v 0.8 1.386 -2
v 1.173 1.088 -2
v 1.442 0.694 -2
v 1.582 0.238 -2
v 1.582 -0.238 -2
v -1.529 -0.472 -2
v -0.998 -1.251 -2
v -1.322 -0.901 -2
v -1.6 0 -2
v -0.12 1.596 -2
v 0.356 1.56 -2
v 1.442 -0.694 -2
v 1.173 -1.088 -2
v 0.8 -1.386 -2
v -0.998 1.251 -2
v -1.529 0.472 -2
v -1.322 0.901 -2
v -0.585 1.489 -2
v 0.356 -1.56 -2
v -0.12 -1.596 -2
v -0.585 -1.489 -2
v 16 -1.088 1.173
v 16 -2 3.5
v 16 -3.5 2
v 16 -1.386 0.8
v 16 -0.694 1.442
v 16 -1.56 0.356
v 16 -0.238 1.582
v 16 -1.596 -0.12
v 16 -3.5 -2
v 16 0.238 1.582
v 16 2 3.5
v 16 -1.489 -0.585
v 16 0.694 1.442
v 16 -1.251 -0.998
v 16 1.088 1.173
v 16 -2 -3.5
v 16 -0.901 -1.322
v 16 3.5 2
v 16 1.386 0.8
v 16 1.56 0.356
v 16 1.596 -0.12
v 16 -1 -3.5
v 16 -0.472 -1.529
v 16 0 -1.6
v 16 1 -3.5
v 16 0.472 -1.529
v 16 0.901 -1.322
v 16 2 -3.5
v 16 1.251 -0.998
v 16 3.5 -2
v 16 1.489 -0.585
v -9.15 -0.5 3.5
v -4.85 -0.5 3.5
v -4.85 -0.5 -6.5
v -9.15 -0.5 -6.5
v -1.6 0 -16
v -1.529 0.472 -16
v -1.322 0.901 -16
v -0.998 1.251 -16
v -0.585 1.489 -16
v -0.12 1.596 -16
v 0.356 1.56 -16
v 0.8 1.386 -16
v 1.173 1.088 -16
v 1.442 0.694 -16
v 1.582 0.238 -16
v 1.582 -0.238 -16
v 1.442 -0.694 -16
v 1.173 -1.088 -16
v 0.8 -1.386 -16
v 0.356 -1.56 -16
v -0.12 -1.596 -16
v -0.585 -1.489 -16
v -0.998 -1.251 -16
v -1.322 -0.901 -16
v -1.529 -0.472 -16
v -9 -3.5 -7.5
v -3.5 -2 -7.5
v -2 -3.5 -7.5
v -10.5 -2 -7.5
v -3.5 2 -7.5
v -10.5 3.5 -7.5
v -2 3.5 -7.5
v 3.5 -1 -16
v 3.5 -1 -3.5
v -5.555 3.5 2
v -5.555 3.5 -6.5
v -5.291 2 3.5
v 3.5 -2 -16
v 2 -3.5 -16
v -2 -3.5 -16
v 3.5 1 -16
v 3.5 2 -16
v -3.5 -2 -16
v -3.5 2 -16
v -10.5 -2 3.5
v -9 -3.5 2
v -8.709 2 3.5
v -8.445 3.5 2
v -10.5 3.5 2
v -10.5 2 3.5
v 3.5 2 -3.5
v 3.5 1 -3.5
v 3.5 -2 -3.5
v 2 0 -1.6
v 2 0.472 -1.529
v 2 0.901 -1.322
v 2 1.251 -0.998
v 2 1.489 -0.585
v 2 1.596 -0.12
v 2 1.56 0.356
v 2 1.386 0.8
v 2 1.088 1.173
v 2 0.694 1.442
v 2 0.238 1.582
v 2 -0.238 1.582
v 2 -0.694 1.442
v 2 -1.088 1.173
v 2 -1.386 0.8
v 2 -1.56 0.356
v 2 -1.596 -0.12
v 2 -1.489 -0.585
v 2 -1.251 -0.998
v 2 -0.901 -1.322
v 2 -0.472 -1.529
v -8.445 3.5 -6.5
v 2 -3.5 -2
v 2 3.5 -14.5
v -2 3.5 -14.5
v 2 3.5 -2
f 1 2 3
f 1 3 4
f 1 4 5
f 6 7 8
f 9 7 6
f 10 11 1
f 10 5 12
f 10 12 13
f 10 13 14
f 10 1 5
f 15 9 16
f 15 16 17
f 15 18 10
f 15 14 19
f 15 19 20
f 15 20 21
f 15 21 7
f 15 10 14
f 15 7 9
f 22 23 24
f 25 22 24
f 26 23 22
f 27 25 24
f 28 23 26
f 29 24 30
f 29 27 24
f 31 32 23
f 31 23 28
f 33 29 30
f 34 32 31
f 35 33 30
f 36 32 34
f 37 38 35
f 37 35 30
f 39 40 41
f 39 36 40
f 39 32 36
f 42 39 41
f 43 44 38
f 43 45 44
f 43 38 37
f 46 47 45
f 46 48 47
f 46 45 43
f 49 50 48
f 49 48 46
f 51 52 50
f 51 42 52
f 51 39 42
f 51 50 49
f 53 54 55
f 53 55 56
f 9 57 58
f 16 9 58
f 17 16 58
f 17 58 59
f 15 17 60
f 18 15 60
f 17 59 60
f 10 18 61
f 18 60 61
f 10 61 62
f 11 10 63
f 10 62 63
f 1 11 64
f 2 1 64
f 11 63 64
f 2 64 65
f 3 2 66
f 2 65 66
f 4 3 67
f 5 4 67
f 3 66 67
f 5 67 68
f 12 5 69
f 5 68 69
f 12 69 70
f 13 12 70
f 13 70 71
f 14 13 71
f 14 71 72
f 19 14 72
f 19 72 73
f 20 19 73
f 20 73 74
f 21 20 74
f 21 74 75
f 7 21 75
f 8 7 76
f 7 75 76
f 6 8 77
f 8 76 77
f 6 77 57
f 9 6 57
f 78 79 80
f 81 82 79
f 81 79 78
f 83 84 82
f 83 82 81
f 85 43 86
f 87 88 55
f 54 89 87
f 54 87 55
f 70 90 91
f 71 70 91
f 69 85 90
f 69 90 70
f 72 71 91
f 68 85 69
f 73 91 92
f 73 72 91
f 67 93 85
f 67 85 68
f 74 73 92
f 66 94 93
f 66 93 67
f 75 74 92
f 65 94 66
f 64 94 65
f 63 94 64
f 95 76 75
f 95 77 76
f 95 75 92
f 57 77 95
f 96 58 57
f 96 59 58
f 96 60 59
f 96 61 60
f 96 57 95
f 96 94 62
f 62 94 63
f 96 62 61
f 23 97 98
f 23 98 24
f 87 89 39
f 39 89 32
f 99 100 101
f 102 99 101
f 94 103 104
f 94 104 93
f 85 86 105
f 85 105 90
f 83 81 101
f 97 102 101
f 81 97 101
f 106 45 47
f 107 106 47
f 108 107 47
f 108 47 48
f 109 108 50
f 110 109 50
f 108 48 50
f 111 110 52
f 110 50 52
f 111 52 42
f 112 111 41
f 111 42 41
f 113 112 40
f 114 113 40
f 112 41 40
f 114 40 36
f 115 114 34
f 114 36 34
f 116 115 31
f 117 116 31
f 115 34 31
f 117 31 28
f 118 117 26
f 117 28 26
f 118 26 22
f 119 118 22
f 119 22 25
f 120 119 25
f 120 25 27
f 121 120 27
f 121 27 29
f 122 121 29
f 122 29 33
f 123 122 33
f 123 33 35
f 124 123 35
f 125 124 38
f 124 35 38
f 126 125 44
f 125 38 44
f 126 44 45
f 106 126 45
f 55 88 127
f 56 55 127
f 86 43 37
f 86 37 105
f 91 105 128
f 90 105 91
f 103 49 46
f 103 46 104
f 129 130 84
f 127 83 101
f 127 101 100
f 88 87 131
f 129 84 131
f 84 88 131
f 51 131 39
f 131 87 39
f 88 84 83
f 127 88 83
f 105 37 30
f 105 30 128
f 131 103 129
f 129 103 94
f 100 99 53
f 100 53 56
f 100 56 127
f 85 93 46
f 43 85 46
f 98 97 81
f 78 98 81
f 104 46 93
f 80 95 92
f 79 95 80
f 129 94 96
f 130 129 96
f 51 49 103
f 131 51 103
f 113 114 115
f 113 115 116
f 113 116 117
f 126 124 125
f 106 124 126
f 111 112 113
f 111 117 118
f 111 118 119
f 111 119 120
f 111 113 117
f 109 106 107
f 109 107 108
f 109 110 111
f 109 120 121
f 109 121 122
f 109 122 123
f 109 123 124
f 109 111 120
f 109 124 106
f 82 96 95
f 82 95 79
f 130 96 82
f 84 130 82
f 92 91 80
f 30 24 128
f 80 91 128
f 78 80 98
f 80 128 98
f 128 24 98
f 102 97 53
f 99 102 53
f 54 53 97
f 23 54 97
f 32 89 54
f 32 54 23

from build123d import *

# Parameters (mm, degrees)
BOSS_EXTRUDE1_DEPTH  = 3.5
SKETCH2_R            = 1.6
CUT_EXTRUDE1_DEPTH   = 14
SKETCH3_R            = 1.6
CUT_EXTRUDE2_DEPTH   = 14
BOSS_EXTRUDE2_DEPTH  = 1
BOSS_EXTRUDE13_START = -19.5
BOSS_EXTRUDE13_DEPTH = 10
BOSS_EXTRUDE14_DEPTH = 1
CHAMFER7_SIZE        = 1.5


with BuildPart() as part:
    # Sketch1 → Boss-Extrude1 (new, symmetric)
    with BuildSketch(Plane(origin=(0, 0, 0), x_dir=(1, 0, 0), z_dir=(0, 1, 0))):
        Polygon((-3.5, 16), (-3.5, -3.5), (16, -3.5), (16, 3.5), (3.5, 3.5), (3.5, 16), align=None)
    extrude(amount=BOSS_EXTRUDE1_DEPTH, both=True)

    # Sketch2 → Cut-Extrude1 (cut)
    with BuildSketch(Plane(origin=(0, 0, -16), x_dir=(-1, 0, 0), z_dir=(0, 0, -1))):
        Circle(SKETCH2_R)
    extrude(amount=-CUT_EXTRUDE1_DEPTH, mode=Mode.SUBTRACT)

    # Sketch3 → Cut-Extrude2 (cut)
    with BuildSketch(Plane(origin=(16, 0, 0), x_dir=(0, 0, -1), z_dir=(1, 0, 0))):
        Circle(SKETCH3_R)
    extrude(amount=-CUT_EXTRUDE2_DEPTH, mode=Mode.SUBTRACT)

    # Sketch4 → Boss-Extrude2 (add, symmetric)
    with BuildSketch(Plane(origin=(0, 0, 0), x_dir=(1, 0, 0), z_dir=(0, 1, 0))):
        Polygon((3.5, 16), (16, 3.5), (3.5, 3.5), align=None)
    extrude(amount=BOSS_EXTRUDE2_DEPTH, both=True)

    # Sketch16 → Boss-Extrude13 (add)
    with BuildSketch(Plane(origin=(0, 0, -16), x_dir=(-1, 0, 0), z_dir=(0, 0, -1)).offset(BOSS_EXTRUDE13_START)):
        Polygon((3.5, -3.5), (3.5, 3.5), (5.555307923, 3.5), (4.85, -0.5), (9.15, -0.5), (8.444692077, 3.5), (10.5, 3.5), (10.5, -3.5), align=None)
    extrude(amount=BOSS_EXTRUDE13_DEPTH)

    # Sketch17 → Boss-Extrude14 (add)
    with BuildSketch(Plane(origin=(0, 0, -6.5), x_dir=(-1, 0, 0), z_dir=(0, 0, -1))):
        Polygon((5.555307923, 3.5), (3.5, 3.5), (3.5, -3.5), (10.5, -3.5), (10.5, 3.5), (8.444692077, 3.5), (9.15, -0.5), (4.85, -0.5), align=None)
        Polygon((9.15, -0.5), (8.444692077, 3.5), (5.555307923, 3.5), (4.85, -0.5), align=None)
    extrude(amount=BOSS_EXTRUDE14_DEPTH)

    # Chamfer7
    chamfer7_edges = [part.edges().sort_by_distance(p)[0] for p in [
        (5.222346039, 3.5, 3.5),
        (9.75, 3.5, -3.5),
        (3.5, 3.5, -9.75),
        (-10.5, -3.5, -2),
        (-9.472346039, 3.5, 3.5),
        (0, 3.5, -16),
        (3.5, -3.5, -9.75),
        (9.75, -3.5, -3.5),
        (2.75, -3.5, 3.5),
        (-3.5, -3.5, -11.75),
        (-3.5, 3.5, -11.75),
    ]]
    chamfer(chamfer7_edges, length=CHAMFER7_SIZE)


solid = part.part
